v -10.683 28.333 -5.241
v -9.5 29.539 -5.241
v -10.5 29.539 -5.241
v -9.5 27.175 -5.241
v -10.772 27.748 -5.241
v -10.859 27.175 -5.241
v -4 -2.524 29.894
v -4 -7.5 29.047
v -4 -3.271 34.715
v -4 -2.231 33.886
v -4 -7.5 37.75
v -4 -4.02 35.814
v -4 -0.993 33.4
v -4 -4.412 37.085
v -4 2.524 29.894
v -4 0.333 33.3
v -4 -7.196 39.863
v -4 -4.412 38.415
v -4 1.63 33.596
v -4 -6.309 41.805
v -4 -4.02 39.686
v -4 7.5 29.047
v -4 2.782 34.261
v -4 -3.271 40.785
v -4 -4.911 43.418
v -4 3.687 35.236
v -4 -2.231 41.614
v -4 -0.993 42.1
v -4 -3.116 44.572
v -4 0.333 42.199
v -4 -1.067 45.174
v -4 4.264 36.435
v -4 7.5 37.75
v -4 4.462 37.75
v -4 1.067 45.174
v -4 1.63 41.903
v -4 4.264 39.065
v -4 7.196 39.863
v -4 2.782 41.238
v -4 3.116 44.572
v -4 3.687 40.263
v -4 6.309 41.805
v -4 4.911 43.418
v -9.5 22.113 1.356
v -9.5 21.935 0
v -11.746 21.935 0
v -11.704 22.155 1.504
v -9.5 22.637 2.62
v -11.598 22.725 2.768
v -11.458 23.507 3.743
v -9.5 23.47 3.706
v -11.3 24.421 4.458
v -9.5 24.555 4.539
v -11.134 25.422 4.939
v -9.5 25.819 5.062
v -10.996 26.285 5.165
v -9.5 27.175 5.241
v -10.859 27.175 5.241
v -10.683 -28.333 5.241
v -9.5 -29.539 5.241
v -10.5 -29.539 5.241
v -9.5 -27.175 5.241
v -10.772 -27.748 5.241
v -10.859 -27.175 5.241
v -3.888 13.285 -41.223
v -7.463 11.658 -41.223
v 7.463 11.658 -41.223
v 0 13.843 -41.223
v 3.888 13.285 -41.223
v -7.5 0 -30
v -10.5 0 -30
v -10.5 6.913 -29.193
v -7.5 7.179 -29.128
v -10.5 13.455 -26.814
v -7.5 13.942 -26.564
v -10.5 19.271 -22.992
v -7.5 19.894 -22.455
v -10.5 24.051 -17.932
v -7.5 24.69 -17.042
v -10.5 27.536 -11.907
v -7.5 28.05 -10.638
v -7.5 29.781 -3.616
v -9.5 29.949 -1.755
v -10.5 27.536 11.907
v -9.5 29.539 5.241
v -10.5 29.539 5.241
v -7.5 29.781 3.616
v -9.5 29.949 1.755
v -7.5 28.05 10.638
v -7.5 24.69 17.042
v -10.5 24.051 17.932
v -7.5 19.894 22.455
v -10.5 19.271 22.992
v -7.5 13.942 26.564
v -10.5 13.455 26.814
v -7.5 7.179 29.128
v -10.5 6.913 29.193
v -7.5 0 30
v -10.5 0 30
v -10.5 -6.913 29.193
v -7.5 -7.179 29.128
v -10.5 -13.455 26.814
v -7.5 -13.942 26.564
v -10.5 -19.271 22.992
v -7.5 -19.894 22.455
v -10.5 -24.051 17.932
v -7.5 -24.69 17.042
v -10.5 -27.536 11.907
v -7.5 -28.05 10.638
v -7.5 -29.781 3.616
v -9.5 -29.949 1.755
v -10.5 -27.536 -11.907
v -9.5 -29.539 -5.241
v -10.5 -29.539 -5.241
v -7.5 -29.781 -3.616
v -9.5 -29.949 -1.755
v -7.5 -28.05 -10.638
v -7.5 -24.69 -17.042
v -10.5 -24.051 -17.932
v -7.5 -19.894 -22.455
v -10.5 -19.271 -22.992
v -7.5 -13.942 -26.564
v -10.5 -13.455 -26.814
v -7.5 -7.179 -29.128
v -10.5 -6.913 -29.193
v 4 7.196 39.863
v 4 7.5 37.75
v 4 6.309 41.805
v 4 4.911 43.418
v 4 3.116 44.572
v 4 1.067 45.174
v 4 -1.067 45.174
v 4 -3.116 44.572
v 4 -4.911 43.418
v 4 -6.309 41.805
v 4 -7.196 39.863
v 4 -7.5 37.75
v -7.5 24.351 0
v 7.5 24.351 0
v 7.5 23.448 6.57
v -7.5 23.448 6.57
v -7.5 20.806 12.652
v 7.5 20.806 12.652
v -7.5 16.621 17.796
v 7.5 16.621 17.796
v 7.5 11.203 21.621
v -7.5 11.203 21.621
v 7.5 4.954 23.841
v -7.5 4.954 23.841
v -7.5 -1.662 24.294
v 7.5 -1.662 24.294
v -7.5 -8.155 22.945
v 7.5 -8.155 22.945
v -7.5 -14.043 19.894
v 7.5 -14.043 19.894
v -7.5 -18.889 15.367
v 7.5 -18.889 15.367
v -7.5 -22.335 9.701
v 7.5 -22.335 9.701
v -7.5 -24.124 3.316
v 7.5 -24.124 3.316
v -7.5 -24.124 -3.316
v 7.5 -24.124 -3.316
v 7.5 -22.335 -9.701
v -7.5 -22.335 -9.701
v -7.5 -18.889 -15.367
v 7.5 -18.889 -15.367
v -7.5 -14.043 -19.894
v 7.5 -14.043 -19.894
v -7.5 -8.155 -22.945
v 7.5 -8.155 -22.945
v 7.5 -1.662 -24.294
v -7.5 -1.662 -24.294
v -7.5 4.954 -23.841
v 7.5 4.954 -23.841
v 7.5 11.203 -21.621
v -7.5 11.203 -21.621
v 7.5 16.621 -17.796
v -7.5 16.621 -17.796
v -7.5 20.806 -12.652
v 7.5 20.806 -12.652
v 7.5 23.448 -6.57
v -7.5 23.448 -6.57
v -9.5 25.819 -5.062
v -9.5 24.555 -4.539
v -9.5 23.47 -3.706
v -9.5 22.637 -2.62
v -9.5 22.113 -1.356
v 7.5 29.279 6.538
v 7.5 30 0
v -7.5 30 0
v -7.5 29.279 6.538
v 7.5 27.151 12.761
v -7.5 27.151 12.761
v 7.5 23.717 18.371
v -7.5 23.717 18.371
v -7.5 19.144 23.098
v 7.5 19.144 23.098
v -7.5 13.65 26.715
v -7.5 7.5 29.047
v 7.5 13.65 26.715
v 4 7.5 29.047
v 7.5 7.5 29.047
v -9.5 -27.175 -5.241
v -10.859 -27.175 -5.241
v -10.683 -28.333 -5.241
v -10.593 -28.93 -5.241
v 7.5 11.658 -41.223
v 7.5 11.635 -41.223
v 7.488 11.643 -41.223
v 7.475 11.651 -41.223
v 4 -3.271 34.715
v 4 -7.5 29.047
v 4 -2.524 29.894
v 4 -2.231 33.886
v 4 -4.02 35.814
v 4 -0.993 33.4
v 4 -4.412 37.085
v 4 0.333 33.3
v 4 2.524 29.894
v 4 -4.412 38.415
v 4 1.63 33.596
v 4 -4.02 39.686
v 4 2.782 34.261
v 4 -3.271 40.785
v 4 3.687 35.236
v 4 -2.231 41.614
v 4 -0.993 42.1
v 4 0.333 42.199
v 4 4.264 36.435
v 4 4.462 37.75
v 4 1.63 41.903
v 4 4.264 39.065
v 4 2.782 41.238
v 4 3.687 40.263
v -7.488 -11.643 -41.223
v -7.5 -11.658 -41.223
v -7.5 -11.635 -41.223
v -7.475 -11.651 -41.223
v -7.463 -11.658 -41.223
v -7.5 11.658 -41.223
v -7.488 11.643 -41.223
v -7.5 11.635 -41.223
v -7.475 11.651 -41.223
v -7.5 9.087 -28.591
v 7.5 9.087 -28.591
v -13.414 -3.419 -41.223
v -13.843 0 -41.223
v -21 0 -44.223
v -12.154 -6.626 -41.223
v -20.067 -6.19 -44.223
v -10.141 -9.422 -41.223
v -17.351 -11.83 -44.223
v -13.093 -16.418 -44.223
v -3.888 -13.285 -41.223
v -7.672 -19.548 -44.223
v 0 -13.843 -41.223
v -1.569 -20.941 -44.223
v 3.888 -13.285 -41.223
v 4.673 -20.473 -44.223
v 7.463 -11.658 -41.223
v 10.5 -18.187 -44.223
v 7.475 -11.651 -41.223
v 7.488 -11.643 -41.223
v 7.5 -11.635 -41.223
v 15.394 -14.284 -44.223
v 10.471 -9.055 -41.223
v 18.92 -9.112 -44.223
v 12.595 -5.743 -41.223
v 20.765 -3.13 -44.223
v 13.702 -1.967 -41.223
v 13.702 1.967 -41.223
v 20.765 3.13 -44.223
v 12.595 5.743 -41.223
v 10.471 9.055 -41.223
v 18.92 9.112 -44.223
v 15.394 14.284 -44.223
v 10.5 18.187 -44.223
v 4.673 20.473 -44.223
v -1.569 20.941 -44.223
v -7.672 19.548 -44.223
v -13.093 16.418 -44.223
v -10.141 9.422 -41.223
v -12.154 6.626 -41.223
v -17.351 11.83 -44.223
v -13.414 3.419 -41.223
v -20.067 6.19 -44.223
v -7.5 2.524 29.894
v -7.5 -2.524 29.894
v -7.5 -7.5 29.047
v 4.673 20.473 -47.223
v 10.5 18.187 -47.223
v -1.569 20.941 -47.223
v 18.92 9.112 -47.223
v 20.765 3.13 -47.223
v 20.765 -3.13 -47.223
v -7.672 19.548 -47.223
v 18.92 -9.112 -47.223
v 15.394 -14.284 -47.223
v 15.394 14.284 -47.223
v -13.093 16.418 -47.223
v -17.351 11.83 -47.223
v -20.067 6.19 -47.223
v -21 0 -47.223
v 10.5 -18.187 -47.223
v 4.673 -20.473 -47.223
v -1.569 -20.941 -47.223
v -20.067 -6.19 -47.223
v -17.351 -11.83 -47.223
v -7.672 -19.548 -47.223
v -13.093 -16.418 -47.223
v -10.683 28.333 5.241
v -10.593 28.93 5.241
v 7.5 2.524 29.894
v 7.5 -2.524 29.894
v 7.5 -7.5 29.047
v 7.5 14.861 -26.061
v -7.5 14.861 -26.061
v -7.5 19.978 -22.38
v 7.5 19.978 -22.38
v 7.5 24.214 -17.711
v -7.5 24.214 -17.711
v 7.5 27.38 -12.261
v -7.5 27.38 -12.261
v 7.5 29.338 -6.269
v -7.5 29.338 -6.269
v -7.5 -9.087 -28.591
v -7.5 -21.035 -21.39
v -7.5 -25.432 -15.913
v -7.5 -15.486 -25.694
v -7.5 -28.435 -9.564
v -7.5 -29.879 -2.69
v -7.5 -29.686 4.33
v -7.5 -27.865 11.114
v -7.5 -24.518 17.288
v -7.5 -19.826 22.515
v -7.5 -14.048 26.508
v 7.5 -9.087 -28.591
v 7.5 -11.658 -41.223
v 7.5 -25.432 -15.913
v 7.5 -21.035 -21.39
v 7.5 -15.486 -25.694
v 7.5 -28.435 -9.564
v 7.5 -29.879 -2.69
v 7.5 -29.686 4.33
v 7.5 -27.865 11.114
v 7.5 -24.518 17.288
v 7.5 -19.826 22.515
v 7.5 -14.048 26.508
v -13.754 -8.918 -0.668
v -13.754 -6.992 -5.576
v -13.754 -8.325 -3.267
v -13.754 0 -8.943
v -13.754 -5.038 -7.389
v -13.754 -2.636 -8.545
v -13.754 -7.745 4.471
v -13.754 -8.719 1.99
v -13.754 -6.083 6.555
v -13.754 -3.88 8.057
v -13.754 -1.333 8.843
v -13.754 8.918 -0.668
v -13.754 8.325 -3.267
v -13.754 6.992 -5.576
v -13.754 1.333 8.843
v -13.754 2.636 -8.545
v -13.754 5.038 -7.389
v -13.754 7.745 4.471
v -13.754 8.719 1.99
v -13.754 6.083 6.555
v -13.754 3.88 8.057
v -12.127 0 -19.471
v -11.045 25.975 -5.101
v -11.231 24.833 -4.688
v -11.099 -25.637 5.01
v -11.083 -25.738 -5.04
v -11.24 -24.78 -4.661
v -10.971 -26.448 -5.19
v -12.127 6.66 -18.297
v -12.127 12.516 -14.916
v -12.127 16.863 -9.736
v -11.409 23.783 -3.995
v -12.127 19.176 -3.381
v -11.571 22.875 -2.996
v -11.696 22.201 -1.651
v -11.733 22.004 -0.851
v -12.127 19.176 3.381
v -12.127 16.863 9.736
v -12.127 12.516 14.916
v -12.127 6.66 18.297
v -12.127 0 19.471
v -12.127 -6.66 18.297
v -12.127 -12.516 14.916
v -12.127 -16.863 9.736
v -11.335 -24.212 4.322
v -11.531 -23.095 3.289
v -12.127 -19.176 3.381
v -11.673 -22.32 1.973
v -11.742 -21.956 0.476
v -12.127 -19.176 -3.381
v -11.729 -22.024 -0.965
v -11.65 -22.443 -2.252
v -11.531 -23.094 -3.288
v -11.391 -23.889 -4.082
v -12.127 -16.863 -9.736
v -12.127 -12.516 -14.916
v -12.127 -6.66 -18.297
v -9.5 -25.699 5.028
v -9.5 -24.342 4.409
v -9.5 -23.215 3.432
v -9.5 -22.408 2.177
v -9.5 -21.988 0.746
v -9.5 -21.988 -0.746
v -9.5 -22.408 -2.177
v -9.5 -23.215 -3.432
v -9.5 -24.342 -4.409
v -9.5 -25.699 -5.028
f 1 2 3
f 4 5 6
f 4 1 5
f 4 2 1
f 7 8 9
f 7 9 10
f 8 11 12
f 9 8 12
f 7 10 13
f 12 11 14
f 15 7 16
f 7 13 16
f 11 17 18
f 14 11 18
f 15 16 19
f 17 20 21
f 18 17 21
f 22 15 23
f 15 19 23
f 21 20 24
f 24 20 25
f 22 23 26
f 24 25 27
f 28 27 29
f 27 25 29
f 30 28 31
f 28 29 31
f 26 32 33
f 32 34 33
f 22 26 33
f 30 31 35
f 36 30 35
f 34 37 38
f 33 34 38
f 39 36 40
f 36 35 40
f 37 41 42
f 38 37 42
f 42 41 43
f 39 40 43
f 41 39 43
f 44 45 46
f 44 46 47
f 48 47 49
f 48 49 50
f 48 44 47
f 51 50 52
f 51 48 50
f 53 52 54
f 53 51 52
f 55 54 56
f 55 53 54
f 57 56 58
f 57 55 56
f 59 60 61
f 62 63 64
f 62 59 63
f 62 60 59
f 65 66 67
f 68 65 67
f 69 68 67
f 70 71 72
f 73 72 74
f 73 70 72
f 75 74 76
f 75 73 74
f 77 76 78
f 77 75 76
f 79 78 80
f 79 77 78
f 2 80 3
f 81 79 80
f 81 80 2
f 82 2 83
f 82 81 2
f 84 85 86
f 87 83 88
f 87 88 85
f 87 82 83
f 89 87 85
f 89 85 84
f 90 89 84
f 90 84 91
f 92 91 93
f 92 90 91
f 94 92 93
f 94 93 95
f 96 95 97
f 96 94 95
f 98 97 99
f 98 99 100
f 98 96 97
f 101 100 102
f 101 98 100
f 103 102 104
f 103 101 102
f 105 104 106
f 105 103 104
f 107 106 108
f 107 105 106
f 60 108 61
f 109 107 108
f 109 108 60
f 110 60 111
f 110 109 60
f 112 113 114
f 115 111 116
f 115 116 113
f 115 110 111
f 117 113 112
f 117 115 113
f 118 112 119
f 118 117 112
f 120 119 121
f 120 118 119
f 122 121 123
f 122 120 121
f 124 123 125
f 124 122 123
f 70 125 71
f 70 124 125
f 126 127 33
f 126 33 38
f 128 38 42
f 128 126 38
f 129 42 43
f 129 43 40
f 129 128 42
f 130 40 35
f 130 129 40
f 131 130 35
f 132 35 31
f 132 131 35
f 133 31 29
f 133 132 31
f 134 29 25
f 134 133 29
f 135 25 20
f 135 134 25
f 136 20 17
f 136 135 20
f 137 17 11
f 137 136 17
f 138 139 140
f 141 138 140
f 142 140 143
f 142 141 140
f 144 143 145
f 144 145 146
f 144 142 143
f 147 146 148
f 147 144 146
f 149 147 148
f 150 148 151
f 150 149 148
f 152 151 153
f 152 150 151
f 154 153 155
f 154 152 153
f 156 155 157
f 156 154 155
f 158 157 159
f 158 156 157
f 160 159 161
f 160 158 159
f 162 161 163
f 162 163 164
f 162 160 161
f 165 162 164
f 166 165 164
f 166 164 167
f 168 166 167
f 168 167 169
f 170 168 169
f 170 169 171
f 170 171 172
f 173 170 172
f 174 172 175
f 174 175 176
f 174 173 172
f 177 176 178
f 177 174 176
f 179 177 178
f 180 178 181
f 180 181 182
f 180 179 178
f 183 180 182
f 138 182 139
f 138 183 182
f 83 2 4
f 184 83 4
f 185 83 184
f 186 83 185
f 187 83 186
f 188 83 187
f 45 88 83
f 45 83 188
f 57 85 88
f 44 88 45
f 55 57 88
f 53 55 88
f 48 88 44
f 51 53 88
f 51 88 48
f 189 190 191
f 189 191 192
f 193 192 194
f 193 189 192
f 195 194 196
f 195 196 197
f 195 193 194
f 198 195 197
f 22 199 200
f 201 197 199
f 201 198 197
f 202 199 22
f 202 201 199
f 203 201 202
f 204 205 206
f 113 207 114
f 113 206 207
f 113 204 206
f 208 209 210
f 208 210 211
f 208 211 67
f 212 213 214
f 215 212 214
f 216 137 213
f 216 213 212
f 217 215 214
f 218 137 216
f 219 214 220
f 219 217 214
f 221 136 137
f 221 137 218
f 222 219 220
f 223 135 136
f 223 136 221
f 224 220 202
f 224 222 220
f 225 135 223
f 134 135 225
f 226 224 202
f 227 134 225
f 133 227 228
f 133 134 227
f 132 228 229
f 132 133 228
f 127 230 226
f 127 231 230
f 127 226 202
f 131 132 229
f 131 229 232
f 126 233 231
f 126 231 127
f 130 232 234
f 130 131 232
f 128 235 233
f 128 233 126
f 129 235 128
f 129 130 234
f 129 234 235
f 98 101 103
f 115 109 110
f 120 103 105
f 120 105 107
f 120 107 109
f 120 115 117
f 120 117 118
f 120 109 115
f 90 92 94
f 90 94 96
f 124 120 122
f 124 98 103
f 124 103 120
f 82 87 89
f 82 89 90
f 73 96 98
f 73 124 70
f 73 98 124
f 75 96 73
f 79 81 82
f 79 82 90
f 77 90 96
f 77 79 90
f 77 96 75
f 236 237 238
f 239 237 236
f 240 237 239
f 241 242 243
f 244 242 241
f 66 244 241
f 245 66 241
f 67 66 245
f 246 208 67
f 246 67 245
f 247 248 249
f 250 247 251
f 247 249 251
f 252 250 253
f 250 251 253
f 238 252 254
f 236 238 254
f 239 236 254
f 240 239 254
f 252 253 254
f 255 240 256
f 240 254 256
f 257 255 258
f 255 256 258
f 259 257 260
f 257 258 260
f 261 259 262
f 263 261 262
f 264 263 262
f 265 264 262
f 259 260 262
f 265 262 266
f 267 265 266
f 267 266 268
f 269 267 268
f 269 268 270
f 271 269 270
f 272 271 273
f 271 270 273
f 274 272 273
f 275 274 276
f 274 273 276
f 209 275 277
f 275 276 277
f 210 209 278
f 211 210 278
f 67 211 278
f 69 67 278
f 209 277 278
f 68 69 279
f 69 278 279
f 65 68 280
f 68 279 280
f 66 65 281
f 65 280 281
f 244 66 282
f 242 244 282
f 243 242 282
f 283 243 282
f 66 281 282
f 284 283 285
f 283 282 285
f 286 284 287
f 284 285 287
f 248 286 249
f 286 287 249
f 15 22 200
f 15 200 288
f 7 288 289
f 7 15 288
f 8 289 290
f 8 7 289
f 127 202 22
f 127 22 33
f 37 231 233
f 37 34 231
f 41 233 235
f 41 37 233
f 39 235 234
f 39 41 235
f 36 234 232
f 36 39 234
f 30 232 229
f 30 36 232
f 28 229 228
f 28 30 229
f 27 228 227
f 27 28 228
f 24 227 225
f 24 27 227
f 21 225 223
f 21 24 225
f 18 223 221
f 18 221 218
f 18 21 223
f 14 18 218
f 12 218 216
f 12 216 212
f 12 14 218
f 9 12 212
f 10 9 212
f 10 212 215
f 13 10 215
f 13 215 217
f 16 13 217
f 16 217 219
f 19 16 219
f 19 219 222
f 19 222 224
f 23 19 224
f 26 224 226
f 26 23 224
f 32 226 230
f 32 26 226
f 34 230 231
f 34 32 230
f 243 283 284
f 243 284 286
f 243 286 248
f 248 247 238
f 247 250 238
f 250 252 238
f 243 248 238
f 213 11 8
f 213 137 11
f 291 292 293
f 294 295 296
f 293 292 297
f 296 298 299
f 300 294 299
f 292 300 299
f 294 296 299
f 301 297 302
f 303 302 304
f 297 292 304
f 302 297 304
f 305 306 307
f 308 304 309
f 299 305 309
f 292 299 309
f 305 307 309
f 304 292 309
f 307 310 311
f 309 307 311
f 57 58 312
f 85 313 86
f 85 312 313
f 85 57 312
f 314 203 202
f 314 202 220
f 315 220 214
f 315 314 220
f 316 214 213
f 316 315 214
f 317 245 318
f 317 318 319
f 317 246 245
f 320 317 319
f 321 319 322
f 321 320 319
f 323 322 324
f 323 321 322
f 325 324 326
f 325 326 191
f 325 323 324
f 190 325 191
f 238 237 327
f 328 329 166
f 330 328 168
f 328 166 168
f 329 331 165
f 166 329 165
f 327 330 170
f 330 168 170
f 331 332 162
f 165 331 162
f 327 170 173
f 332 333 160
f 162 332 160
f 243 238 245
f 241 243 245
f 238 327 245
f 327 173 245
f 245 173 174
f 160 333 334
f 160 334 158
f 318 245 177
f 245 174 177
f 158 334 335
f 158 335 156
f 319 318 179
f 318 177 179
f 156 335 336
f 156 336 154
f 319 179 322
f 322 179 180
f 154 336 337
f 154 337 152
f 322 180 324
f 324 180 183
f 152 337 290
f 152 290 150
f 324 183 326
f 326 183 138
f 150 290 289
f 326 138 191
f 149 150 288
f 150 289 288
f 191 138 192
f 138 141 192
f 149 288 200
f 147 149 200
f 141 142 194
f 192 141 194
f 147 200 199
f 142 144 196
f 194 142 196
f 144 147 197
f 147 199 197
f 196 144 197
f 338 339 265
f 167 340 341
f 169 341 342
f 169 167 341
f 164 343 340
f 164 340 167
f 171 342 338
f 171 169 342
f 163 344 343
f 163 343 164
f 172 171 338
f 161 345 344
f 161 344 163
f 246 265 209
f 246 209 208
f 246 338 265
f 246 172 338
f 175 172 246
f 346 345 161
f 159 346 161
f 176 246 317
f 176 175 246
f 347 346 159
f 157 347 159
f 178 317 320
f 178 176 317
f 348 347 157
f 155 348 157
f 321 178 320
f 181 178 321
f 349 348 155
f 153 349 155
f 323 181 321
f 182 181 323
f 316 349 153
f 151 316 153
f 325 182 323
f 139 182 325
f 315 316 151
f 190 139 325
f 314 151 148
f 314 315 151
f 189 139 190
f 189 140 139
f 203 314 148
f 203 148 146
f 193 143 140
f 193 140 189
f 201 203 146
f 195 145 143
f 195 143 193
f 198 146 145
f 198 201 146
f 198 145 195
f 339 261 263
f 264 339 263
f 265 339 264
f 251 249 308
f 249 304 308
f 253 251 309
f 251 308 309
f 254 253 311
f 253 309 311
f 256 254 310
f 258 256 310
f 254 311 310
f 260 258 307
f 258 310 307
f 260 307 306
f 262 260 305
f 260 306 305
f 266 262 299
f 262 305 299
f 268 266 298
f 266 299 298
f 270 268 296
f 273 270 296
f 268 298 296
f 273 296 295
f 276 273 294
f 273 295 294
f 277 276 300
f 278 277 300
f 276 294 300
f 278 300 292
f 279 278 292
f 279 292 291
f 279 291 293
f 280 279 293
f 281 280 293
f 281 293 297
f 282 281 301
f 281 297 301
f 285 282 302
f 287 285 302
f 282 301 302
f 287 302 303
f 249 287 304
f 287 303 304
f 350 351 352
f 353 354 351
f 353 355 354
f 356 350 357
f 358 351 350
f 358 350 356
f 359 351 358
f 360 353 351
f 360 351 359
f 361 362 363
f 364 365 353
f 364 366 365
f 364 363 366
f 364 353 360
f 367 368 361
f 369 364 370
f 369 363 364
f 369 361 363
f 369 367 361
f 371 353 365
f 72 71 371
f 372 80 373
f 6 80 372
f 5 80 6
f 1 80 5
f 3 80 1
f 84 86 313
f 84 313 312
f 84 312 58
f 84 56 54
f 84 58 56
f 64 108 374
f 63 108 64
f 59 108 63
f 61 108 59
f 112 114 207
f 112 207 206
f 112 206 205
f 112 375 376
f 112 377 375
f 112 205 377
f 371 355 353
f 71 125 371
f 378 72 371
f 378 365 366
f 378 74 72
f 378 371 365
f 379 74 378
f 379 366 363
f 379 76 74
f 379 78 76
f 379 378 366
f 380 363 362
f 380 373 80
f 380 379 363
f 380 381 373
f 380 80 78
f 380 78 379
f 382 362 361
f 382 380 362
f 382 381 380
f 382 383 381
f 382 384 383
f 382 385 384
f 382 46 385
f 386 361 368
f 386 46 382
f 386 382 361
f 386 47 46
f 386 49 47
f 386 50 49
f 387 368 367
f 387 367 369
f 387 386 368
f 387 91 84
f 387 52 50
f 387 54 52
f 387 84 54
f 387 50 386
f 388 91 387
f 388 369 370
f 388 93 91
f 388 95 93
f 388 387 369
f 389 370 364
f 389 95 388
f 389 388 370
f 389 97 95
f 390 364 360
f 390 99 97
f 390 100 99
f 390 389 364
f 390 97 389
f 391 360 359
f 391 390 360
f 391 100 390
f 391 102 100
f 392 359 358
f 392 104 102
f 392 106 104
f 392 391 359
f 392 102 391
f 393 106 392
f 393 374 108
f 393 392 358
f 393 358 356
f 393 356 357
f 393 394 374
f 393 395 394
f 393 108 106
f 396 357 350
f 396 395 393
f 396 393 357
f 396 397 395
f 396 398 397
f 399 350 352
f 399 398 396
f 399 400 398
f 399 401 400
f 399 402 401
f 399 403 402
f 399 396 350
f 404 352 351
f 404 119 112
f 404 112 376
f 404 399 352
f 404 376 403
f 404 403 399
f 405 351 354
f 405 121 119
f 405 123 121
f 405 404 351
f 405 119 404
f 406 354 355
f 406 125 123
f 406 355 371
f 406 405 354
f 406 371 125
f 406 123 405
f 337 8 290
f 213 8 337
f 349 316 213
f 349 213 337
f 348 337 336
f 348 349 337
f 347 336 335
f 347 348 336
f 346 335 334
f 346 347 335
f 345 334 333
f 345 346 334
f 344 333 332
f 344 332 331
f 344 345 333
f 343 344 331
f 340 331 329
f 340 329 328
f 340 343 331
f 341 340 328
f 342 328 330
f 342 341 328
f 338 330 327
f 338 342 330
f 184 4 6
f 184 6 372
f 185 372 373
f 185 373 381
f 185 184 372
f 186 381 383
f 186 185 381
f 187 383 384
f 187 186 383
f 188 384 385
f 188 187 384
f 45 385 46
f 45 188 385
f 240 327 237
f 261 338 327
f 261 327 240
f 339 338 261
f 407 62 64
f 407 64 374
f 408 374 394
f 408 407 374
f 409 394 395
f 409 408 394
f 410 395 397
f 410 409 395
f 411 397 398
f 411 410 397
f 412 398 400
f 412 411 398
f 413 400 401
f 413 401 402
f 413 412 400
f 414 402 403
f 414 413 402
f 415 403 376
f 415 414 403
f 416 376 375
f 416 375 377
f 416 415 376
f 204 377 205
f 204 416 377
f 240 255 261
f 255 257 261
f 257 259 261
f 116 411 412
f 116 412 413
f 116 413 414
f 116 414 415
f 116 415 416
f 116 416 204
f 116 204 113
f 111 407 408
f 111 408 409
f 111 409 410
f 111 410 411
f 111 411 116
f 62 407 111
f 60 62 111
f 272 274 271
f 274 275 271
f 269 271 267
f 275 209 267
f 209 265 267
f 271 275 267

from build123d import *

# Parameters (mm, degrees)
F0_R     = 24.35068
F1_DEPTH = 7.5
F0_R_2   = 4.46193
F2_DEPTH = 4
F9_DEPTH = 25


with BuildPart() as f1:
    # F0 (on Right) → F1 (new body, symmetric)
    with BuildSketch(Plane.YZ):
        with BuildLine():
            ThreePointArc((9.087163, -28.590618), (24.213786, -17.711368), (30, 0))
            ThreePointArc((30, 0), (23.717082, 18.371173), (7.5, 29.047375))
            ThreePointArc((7.5, 29.047375), (0, 30), (-7.5, 29.047375))
            ThreePointArc((-7.5, 29.047375), (-29.988632, 0.82579), (-9.087163, -28.590618))
            ThreePointArc((-9.087163, -28.590618), (0, -30), (9.087163, -28.590618))
        make_face()
        Circle(F0_R, mode=Mode.SUBTRACT)
        with BuildLine():
            Line((11.658487, -41.223045), (9.087163, -28.590618))
            ThreePointArc((9.087163, -28.590618), (0, -30), (-9.087163, -28.590618))
            Line((-9.087163, -28.590618), (-11.658487, -41.223045))
            Line((-11.658487, -41.223045), (11.658487, -41.223045))
        make_face()
    extrude(amount=F1_DEPTH, both=True)

    # F0 (on Right) → F2 (join, symmetric)
    with BuildSketch(Plane.YZ):
        with BuildLine():
            ThreePointArc((-7.5, 29.047375), (0, 30), (7.5, 29.047375))
            Line((7.5, 29.047375), (7.5, 37.74994))
            ThreePointArc((7.5, 37.74994), (0, 45.24994), (-7.5, 37.74994))
            Line((-7.5, 37.74994), (-7.5, 29.047375))
        make_face()
        with Locations((0, 37.74994)):
            Circle(F0_R_2, mode=Mode.SUBTRACT)
    extrude(amount=F2_DEPTH, both=True)

    # F5 (on Front) → F10 (revolve)
    with BuildSketch(Plane.XZ):
        Polygon((0, -41.223045), (-13.842631, -41.223045), (-21, -44.223045), (-21, -47.223045), (0, -47.223045), align=None)
    revolve(axis=Axis((0, 0, -44.223045), (0, 0, 1)))


with BuildPart() as f6:
    # F5 (on Front) → F6 (revolve)
    with BuildSketch(Plane.XZ):
        Polygon((-13.754217, -8.942734), (-10.5, -30), (-7.5, -30), (-7.5, 0), (-13.754217, 0), align=None)
    revolve(axis=Axis((-10.627109, 0, 0), (1, 0, 0)))

    # F8 (on offset) → F9 (cut)
    with BuildSketch(Plane(origin=(-9.5, 0, 0), x_dir=(0, -1, 0), z_dir=(-1, 0, 0))):
        with BuildLine():
            ThreePointArc((27.17534, -5.240747), (30.881108, -3.705768), (32.416087, 0))
            ThreePointArc((32.416087, 0), (30.881108, 3.705768), (27.17534, 5.240747))
            ThreePointArc((27.17534, 5.240747), (21.934593, 0), (27.17534, -5.240747))
        make_face()
        with BuildLine():
            ThreePointArc((-27.17534, -5.240747), (-23.469572, -3.705768), (-21.934593, 0))
            ThreePointArc((-21.934593, 0), (-23.469572, 3.705768), (-27.17534, 5.240747))
            ThreePointArc((-27.17534, 5.240747), (-32.416087, 0), (-27.17534, -5.240747))
        make_face()
        with BuildLine():
            ThreePointArc((-27.17534, -5.240747), (-32.416087, 0), (-27.17534, 5.240747))
            Line((-27.17534, 5.240747), (-34.886351, 5.240747))
            Line((-34.886351, 5.240747), (-34.886351, -5.240747))
            Line((-34.886351, -5.240747), (-27.17534, -5.240747))
        make_face()
        with BuildLine():
            ThreePointArc((27.17534, 5.240747), (30.881108, 3.705768), (32.416087, 0))
            ThreePointArc((32.416087, 0), (30.881108, -3.705768), (27.17534, -5.240747))
            Line((27.17534, -5.240747), (34.886351, -5.240747))
            Line((34.886351, -5.240747), (34.886351, 5.240747))
            Line((34.886351, 5.240747), (27.17534, 5.240747))
        make_face()
    extrude(amount=F9_DEPTH, mode=Mode.SUBTRACT)


solid = Compound([f1.part, f6.part])
